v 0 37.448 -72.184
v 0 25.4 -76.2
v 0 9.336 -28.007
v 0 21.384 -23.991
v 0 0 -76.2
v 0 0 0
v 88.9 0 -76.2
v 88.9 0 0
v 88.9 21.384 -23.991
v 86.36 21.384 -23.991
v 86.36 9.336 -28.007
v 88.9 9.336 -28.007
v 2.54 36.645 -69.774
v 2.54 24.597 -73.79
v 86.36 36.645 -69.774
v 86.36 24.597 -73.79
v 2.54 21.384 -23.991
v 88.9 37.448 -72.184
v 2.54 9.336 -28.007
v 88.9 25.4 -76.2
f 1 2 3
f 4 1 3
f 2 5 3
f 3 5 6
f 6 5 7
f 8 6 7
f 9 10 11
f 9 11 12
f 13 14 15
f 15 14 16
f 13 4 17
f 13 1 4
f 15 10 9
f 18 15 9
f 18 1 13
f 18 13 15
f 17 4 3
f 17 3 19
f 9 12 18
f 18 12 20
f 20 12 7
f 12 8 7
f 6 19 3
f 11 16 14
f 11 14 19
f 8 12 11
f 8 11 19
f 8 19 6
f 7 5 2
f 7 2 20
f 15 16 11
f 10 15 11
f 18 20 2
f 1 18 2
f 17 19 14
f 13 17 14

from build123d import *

# Parameters (mm, degrees)
SKETCH1_W           = 88.9
SKETCH1_H           = 76.2
BOSS_EXTRUDE1_DEPTH = 25.4
CUT_EXTRUDE1_DEPTH  = 120.811560377
BOSS_EXTRUDE2_DEPTH = 12.7


with BuildPart() as part:
    # Sketch1 → Boss-Extrude1 (new body)
    with BuildSketch(Plane(origin=(0, 0, 0), x_dir=(1, 0, 0), z_dir=(0, 1, 0))):
        with Locations((44.45, 38.1)):
            Rectangle(SKETCH1_W, SKETCH1_H)
    extrude(amount=BOSS_EXTRUDE1_DEPTH)

    # Sketch2 → Cut-Extrude1 (cut, through all)
    with BuildSketch(Plane(origin=(88.9, 0, 0), x_dir=(0, 0, -1), z_dir=(1, 0, 0))):
        Polygon((76.2, 25.4), (0, 0), (0, 25.4), align=None)
    extrude(amount=-CUT_EXTRUDE1_DEPTH, mode=Mode.SUBTRACT)

    # Sketch3 → Boss-Extrude2 (add)
    with BuildSketch(Plane(origin=(0, 0, 0), x_dir=(1, 0, 0), z_dir=(0, 0.9486832980505139, 0.3162277660168379))):
        Polygon((0, 29.521852568), (2.54, 29.521852568), (2.54, 77.781852568), (86.36, 77.781852568), (86.36, 29.521852568), (88.9, 29.521852568), (88.9, 80.321852568), (0, 80.321852568), align=None)
    extrude(amount=BOSS_EXTRUDE2_DEPTH)


solid = part.part
